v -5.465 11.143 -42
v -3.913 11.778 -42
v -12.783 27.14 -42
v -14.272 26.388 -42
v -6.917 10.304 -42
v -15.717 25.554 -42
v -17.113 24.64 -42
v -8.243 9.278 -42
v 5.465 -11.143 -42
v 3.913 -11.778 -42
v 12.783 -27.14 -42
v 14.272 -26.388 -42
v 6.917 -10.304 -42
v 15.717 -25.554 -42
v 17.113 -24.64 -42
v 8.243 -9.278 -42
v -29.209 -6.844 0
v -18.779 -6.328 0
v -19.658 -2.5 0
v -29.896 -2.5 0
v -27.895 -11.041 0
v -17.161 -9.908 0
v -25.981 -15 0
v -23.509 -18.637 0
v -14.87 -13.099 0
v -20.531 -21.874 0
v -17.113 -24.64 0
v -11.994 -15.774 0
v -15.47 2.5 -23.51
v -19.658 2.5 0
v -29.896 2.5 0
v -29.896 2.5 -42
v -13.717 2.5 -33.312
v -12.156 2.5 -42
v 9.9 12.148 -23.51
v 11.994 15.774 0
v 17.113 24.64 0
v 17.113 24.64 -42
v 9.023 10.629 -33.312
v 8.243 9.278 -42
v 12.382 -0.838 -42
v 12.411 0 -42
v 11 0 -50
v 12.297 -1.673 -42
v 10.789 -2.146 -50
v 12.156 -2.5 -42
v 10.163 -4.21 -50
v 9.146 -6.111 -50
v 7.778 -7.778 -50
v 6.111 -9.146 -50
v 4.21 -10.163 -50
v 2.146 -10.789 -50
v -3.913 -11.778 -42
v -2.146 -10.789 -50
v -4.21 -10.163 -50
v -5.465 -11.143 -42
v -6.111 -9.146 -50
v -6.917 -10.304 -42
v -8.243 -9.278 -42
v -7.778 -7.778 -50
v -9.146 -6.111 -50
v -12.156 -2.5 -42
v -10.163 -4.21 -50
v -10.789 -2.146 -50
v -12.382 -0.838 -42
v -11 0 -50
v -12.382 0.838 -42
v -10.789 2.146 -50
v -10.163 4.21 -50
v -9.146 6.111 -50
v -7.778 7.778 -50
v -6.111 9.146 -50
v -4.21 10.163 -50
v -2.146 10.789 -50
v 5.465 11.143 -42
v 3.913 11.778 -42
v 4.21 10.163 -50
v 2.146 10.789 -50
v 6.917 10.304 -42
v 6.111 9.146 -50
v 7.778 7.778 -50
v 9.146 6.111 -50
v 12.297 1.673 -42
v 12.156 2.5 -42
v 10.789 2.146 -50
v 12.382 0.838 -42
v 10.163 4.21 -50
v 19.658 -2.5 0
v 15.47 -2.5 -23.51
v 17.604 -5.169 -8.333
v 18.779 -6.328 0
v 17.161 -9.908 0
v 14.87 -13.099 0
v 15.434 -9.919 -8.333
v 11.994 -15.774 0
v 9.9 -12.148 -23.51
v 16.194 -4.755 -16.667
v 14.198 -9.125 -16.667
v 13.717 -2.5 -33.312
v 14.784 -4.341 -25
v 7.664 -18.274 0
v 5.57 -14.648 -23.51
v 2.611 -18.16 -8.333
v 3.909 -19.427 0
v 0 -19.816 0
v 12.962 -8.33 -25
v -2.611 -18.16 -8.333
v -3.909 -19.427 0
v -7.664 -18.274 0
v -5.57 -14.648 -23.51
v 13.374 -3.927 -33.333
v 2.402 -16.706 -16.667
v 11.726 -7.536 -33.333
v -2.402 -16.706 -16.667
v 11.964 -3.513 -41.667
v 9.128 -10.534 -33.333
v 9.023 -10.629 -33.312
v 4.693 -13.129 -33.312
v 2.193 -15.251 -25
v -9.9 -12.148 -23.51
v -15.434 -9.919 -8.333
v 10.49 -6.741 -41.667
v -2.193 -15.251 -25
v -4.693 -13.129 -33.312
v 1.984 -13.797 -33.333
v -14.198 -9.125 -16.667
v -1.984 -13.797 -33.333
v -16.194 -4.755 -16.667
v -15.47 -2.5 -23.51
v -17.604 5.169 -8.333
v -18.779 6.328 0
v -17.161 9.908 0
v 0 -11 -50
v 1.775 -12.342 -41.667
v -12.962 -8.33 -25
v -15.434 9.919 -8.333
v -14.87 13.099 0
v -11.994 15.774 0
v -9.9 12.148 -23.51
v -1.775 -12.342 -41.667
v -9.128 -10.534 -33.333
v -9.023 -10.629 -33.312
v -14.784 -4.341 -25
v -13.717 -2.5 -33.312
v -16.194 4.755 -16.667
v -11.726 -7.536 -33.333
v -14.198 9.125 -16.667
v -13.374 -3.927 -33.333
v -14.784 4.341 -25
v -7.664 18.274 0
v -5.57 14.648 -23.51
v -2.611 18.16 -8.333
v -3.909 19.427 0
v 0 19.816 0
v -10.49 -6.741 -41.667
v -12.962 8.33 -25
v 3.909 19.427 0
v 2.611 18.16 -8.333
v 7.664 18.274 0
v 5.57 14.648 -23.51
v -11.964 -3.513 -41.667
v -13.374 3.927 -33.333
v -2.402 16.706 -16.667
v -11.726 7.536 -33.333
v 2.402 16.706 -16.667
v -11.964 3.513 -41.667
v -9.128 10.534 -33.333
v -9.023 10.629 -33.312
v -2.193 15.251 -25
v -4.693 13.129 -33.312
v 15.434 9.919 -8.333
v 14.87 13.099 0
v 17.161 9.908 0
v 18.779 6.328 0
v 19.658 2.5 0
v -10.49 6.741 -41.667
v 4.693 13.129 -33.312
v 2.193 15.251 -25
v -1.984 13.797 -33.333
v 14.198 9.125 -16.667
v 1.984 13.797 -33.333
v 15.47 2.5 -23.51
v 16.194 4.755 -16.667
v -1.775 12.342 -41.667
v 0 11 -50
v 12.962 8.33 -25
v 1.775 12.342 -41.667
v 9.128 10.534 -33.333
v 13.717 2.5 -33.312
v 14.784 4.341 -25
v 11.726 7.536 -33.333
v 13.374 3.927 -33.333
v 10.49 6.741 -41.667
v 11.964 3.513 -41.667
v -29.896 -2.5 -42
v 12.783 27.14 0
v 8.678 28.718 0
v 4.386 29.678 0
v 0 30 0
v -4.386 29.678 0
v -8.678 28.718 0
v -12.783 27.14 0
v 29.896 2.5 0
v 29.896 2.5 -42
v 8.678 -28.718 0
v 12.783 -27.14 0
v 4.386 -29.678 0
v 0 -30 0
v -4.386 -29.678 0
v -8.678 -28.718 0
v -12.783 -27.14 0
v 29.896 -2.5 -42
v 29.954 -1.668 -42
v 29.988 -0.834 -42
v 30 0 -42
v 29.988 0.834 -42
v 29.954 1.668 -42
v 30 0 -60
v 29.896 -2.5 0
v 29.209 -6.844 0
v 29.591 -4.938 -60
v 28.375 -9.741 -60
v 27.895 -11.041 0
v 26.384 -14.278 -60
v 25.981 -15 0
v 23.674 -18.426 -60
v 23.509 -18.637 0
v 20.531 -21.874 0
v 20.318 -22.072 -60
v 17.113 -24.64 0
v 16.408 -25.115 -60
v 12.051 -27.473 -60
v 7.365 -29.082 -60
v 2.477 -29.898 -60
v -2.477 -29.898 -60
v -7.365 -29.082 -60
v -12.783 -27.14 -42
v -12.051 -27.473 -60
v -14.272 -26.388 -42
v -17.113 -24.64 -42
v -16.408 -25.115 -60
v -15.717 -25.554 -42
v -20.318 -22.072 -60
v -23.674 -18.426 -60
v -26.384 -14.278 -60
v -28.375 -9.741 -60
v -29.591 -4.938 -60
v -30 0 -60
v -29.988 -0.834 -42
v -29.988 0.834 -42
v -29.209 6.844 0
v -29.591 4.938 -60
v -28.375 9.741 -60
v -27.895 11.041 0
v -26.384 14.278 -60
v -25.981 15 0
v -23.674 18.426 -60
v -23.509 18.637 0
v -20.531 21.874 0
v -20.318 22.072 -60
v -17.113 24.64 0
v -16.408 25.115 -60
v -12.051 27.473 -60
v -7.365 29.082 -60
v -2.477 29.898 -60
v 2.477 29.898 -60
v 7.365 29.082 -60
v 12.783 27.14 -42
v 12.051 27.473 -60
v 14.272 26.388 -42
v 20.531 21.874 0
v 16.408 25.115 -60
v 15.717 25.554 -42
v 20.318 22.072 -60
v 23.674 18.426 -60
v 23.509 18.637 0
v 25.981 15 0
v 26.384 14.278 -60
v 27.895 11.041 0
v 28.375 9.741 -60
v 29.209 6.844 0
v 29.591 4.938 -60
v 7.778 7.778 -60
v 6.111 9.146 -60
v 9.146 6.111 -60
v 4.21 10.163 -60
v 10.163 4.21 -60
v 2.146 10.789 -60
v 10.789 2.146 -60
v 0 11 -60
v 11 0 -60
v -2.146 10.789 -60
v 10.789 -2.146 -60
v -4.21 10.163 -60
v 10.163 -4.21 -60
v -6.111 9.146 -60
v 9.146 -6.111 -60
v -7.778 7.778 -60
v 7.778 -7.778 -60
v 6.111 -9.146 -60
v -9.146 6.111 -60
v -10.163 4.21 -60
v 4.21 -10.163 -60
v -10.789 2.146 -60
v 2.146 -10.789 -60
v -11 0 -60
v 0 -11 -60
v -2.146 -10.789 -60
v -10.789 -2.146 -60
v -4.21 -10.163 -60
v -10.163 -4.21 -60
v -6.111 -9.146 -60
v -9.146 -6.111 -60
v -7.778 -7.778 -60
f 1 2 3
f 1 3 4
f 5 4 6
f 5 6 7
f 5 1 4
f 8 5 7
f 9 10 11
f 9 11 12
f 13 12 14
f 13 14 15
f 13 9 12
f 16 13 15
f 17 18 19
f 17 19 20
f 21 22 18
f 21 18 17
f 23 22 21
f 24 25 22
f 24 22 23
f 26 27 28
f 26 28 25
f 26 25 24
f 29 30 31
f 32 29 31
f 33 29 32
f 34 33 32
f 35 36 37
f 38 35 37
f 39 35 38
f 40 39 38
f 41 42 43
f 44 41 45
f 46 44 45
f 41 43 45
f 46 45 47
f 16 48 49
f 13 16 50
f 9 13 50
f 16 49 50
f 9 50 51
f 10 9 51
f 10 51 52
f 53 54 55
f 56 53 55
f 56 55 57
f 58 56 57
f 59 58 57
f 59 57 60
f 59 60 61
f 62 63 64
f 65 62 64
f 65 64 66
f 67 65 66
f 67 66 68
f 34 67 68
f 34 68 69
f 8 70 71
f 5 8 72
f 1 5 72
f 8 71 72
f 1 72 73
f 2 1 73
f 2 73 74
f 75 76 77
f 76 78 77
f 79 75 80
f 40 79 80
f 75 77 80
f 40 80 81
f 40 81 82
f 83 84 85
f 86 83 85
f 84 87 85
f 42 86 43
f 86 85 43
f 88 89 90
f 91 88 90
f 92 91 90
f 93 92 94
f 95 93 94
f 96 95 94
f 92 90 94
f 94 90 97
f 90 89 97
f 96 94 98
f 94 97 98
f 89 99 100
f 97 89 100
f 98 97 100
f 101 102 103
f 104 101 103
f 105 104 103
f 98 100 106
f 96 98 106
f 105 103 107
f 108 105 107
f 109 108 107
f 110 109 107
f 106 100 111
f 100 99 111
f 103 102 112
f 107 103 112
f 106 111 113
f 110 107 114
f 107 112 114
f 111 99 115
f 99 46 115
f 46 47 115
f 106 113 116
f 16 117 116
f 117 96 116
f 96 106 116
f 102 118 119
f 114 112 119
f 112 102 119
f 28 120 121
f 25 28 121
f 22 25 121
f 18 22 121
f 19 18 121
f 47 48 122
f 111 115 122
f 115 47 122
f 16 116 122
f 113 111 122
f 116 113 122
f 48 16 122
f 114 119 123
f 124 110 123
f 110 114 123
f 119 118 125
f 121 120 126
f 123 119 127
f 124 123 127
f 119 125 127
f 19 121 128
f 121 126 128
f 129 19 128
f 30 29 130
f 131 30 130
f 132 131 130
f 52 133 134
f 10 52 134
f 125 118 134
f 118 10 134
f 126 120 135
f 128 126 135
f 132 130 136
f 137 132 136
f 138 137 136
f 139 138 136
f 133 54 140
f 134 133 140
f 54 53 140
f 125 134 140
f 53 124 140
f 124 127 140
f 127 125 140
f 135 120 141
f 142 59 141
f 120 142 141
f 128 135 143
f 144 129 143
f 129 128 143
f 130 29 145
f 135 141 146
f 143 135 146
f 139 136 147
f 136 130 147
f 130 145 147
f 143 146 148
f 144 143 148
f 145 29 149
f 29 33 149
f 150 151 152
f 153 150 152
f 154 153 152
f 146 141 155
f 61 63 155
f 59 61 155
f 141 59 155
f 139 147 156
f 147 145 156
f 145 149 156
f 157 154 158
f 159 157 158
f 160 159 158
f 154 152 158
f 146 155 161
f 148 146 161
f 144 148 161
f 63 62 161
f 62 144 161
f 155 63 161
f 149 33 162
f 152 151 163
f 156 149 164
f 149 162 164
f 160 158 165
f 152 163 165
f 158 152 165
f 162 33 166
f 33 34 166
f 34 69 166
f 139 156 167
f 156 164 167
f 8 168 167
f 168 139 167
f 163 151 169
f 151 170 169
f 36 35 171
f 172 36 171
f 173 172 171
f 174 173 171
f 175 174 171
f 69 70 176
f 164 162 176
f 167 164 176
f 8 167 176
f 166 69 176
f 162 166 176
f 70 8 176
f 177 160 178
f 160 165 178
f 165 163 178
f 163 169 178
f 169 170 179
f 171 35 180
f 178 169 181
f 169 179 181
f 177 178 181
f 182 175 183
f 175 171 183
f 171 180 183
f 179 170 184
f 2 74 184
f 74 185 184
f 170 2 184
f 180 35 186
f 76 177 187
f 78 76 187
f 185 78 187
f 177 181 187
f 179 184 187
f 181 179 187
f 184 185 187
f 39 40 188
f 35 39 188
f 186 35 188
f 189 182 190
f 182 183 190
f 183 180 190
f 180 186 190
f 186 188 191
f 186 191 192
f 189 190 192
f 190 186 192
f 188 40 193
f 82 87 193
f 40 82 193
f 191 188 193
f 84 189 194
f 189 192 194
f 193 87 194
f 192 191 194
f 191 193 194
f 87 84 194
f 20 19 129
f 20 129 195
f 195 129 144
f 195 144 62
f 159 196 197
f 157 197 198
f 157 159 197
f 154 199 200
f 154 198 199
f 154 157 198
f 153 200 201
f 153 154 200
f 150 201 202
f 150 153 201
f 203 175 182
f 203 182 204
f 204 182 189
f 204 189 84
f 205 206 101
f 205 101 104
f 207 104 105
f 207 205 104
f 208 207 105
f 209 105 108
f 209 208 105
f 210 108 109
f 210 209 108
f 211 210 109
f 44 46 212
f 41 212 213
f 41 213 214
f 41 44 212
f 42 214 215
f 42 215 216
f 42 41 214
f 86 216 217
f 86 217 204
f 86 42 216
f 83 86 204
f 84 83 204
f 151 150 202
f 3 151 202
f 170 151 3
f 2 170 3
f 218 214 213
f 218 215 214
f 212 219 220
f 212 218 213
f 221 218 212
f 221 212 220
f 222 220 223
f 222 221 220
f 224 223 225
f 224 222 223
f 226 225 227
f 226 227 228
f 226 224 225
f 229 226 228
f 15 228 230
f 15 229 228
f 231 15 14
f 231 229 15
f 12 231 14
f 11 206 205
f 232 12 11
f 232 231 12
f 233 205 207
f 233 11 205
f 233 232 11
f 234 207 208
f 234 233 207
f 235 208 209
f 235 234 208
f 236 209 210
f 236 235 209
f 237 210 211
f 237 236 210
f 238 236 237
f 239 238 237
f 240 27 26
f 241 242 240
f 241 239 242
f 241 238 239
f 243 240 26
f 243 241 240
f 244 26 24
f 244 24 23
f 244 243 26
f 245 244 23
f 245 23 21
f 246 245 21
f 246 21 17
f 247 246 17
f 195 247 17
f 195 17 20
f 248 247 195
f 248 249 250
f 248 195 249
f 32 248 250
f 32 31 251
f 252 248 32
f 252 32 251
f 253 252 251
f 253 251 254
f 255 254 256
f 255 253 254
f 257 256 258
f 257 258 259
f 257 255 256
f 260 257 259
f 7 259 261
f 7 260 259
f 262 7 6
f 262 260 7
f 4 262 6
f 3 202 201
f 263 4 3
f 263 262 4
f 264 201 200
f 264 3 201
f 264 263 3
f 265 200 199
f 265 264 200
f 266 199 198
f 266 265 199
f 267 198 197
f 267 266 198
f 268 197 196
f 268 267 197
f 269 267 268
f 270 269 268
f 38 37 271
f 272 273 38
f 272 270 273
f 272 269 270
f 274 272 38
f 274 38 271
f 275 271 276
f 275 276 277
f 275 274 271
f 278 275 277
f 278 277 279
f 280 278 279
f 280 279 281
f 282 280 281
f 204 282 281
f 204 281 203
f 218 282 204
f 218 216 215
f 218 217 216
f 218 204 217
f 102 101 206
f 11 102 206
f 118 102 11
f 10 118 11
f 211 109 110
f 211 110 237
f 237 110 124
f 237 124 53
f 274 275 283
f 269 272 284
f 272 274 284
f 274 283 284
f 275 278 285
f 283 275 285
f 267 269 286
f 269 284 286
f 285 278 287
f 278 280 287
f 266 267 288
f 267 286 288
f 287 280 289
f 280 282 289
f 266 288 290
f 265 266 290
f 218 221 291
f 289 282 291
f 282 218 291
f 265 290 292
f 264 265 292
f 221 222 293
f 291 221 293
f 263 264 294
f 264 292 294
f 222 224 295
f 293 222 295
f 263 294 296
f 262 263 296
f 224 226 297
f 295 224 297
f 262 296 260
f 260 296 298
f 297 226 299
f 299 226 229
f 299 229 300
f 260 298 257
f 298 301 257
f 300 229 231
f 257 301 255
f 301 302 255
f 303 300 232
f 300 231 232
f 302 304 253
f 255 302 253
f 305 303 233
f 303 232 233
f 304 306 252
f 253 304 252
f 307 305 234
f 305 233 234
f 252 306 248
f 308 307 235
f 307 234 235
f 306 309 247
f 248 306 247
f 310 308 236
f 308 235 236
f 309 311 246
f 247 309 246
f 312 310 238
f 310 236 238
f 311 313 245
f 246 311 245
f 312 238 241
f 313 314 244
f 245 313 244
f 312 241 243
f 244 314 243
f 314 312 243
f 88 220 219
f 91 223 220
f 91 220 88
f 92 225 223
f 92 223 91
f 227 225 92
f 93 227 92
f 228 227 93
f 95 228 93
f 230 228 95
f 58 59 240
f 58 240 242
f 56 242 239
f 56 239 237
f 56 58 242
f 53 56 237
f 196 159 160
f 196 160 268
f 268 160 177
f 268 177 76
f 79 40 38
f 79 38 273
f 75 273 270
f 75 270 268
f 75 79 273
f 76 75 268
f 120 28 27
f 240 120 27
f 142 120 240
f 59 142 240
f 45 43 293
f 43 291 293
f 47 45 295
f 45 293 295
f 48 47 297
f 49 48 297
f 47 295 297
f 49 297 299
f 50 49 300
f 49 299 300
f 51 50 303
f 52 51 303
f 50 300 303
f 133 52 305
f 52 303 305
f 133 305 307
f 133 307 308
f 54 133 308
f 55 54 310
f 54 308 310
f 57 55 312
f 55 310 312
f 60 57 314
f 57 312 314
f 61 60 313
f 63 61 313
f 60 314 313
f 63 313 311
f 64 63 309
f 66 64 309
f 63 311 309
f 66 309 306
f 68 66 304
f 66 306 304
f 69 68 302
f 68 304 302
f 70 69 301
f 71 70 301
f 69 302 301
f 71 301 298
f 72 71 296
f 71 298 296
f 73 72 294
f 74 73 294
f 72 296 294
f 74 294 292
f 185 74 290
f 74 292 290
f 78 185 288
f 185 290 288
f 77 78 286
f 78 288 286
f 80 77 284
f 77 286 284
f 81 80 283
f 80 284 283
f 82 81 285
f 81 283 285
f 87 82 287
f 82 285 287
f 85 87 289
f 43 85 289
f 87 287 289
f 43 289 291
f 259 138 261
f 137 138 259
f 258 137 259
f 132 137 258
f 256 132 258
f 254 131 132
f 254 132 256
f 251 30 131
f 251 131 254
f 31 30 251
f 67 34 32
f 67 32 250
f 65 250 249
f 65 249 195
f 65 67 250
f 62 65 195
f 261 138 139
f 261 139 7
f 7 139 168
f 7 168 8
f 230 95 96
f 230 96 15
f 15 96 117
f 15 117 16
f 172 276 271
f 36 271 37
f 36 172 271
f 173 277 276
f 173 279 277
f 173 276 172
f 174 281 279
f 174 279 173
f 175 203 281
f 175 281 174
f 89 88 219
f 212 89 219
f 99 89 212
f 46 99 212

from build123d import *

# Parameters (mm, degrees)
SKETCH4_W          = 60
SKETCH4_H          = 30
CUT_EXTRUDE1_REACH = 75.485
SKETCH6_W          = 42
SKETCH6_H          = 5
CIRPATTERN3_COUNT  = 6


with BuildPart() as part:
    # Sketch4 → Revolve1 (revolve)
    with BuildSketch(Plane(origin=(0, 0, 0), x_dir=(0, 0, -1), z_dir=(1, 0, 0)), mode=Mode.PRIVATE) as revolve1_sk:
        with Locations((30, 15)):
            Rectangle(SKETCH4_W, SKETCH4_H)
    revolve(revolve1_sk.sketch.rotate(Axis((0, 0, 24.398391619), (0, 0, -1)), 90), axis=Axis((0, 0, 24.398391619), (0, 0, -1)))

    # Sketch5 → Cut-Revolve1 (revolve, cut)
    with BuildSketch(Plane(origin=(0, 0, 0), x_dir=(0, 0, -1), z_dir=(1, 0, 0)), mode=Mode.PRIVATE) as cut_revolve1_sk:
        Polygon((0, 0), (0, 19.816349035), (50, 11), (60, 11), (60, 0), align=None)
    revolve(cut_revolve1_sk.sketch.rotate(Axis((0, 0, 8.48865663), (0, 0, -1)), 90), axis=Axis((0, 0, 8.48865663), (0, 0, -1)), mode=Mode.SUBTRACT)

    # Sketch6 → Cut-Extrude1 (cut, up to next)
    with BuildSketch(Plane(origin=(0, 0, 0), x_dir=(0, 0, -1), z_dir=(1, 0, 0)), mode=Mode.PRIVATE) as cut_extrude1_sk1:
        with Locations((21, 0)):
            Rectangle(SKETCH6_W, SKETCH6_H)
    cut_extrude1_tool1 = extrude(cut_extrude1_sk1.sketch, amount=CUT_EXTRUDE1_REACH, mode=Mode.PRIVATE) & part.part
    cut_extrude1 = cut_extrude1_tool1.solids().sort_by_distance((0, 0, -21))[0]
    add(cut_extrude1, mode=Mode.SUBTRACT)

    # CirPattern3: Cut-Extrude1 ×6 about axis
    cirpattern3_axis = Axis((0, 0, 0), (0, 0, 1))
    for i in range(1, CIRPATTERN3_COUNT):
        add(cut_extrude1.rotate(cirpattern3_axis, i * 360 / CIRPATTERN3_COUNT), mode=Mode.SUBTRACT)


solid = part.part
